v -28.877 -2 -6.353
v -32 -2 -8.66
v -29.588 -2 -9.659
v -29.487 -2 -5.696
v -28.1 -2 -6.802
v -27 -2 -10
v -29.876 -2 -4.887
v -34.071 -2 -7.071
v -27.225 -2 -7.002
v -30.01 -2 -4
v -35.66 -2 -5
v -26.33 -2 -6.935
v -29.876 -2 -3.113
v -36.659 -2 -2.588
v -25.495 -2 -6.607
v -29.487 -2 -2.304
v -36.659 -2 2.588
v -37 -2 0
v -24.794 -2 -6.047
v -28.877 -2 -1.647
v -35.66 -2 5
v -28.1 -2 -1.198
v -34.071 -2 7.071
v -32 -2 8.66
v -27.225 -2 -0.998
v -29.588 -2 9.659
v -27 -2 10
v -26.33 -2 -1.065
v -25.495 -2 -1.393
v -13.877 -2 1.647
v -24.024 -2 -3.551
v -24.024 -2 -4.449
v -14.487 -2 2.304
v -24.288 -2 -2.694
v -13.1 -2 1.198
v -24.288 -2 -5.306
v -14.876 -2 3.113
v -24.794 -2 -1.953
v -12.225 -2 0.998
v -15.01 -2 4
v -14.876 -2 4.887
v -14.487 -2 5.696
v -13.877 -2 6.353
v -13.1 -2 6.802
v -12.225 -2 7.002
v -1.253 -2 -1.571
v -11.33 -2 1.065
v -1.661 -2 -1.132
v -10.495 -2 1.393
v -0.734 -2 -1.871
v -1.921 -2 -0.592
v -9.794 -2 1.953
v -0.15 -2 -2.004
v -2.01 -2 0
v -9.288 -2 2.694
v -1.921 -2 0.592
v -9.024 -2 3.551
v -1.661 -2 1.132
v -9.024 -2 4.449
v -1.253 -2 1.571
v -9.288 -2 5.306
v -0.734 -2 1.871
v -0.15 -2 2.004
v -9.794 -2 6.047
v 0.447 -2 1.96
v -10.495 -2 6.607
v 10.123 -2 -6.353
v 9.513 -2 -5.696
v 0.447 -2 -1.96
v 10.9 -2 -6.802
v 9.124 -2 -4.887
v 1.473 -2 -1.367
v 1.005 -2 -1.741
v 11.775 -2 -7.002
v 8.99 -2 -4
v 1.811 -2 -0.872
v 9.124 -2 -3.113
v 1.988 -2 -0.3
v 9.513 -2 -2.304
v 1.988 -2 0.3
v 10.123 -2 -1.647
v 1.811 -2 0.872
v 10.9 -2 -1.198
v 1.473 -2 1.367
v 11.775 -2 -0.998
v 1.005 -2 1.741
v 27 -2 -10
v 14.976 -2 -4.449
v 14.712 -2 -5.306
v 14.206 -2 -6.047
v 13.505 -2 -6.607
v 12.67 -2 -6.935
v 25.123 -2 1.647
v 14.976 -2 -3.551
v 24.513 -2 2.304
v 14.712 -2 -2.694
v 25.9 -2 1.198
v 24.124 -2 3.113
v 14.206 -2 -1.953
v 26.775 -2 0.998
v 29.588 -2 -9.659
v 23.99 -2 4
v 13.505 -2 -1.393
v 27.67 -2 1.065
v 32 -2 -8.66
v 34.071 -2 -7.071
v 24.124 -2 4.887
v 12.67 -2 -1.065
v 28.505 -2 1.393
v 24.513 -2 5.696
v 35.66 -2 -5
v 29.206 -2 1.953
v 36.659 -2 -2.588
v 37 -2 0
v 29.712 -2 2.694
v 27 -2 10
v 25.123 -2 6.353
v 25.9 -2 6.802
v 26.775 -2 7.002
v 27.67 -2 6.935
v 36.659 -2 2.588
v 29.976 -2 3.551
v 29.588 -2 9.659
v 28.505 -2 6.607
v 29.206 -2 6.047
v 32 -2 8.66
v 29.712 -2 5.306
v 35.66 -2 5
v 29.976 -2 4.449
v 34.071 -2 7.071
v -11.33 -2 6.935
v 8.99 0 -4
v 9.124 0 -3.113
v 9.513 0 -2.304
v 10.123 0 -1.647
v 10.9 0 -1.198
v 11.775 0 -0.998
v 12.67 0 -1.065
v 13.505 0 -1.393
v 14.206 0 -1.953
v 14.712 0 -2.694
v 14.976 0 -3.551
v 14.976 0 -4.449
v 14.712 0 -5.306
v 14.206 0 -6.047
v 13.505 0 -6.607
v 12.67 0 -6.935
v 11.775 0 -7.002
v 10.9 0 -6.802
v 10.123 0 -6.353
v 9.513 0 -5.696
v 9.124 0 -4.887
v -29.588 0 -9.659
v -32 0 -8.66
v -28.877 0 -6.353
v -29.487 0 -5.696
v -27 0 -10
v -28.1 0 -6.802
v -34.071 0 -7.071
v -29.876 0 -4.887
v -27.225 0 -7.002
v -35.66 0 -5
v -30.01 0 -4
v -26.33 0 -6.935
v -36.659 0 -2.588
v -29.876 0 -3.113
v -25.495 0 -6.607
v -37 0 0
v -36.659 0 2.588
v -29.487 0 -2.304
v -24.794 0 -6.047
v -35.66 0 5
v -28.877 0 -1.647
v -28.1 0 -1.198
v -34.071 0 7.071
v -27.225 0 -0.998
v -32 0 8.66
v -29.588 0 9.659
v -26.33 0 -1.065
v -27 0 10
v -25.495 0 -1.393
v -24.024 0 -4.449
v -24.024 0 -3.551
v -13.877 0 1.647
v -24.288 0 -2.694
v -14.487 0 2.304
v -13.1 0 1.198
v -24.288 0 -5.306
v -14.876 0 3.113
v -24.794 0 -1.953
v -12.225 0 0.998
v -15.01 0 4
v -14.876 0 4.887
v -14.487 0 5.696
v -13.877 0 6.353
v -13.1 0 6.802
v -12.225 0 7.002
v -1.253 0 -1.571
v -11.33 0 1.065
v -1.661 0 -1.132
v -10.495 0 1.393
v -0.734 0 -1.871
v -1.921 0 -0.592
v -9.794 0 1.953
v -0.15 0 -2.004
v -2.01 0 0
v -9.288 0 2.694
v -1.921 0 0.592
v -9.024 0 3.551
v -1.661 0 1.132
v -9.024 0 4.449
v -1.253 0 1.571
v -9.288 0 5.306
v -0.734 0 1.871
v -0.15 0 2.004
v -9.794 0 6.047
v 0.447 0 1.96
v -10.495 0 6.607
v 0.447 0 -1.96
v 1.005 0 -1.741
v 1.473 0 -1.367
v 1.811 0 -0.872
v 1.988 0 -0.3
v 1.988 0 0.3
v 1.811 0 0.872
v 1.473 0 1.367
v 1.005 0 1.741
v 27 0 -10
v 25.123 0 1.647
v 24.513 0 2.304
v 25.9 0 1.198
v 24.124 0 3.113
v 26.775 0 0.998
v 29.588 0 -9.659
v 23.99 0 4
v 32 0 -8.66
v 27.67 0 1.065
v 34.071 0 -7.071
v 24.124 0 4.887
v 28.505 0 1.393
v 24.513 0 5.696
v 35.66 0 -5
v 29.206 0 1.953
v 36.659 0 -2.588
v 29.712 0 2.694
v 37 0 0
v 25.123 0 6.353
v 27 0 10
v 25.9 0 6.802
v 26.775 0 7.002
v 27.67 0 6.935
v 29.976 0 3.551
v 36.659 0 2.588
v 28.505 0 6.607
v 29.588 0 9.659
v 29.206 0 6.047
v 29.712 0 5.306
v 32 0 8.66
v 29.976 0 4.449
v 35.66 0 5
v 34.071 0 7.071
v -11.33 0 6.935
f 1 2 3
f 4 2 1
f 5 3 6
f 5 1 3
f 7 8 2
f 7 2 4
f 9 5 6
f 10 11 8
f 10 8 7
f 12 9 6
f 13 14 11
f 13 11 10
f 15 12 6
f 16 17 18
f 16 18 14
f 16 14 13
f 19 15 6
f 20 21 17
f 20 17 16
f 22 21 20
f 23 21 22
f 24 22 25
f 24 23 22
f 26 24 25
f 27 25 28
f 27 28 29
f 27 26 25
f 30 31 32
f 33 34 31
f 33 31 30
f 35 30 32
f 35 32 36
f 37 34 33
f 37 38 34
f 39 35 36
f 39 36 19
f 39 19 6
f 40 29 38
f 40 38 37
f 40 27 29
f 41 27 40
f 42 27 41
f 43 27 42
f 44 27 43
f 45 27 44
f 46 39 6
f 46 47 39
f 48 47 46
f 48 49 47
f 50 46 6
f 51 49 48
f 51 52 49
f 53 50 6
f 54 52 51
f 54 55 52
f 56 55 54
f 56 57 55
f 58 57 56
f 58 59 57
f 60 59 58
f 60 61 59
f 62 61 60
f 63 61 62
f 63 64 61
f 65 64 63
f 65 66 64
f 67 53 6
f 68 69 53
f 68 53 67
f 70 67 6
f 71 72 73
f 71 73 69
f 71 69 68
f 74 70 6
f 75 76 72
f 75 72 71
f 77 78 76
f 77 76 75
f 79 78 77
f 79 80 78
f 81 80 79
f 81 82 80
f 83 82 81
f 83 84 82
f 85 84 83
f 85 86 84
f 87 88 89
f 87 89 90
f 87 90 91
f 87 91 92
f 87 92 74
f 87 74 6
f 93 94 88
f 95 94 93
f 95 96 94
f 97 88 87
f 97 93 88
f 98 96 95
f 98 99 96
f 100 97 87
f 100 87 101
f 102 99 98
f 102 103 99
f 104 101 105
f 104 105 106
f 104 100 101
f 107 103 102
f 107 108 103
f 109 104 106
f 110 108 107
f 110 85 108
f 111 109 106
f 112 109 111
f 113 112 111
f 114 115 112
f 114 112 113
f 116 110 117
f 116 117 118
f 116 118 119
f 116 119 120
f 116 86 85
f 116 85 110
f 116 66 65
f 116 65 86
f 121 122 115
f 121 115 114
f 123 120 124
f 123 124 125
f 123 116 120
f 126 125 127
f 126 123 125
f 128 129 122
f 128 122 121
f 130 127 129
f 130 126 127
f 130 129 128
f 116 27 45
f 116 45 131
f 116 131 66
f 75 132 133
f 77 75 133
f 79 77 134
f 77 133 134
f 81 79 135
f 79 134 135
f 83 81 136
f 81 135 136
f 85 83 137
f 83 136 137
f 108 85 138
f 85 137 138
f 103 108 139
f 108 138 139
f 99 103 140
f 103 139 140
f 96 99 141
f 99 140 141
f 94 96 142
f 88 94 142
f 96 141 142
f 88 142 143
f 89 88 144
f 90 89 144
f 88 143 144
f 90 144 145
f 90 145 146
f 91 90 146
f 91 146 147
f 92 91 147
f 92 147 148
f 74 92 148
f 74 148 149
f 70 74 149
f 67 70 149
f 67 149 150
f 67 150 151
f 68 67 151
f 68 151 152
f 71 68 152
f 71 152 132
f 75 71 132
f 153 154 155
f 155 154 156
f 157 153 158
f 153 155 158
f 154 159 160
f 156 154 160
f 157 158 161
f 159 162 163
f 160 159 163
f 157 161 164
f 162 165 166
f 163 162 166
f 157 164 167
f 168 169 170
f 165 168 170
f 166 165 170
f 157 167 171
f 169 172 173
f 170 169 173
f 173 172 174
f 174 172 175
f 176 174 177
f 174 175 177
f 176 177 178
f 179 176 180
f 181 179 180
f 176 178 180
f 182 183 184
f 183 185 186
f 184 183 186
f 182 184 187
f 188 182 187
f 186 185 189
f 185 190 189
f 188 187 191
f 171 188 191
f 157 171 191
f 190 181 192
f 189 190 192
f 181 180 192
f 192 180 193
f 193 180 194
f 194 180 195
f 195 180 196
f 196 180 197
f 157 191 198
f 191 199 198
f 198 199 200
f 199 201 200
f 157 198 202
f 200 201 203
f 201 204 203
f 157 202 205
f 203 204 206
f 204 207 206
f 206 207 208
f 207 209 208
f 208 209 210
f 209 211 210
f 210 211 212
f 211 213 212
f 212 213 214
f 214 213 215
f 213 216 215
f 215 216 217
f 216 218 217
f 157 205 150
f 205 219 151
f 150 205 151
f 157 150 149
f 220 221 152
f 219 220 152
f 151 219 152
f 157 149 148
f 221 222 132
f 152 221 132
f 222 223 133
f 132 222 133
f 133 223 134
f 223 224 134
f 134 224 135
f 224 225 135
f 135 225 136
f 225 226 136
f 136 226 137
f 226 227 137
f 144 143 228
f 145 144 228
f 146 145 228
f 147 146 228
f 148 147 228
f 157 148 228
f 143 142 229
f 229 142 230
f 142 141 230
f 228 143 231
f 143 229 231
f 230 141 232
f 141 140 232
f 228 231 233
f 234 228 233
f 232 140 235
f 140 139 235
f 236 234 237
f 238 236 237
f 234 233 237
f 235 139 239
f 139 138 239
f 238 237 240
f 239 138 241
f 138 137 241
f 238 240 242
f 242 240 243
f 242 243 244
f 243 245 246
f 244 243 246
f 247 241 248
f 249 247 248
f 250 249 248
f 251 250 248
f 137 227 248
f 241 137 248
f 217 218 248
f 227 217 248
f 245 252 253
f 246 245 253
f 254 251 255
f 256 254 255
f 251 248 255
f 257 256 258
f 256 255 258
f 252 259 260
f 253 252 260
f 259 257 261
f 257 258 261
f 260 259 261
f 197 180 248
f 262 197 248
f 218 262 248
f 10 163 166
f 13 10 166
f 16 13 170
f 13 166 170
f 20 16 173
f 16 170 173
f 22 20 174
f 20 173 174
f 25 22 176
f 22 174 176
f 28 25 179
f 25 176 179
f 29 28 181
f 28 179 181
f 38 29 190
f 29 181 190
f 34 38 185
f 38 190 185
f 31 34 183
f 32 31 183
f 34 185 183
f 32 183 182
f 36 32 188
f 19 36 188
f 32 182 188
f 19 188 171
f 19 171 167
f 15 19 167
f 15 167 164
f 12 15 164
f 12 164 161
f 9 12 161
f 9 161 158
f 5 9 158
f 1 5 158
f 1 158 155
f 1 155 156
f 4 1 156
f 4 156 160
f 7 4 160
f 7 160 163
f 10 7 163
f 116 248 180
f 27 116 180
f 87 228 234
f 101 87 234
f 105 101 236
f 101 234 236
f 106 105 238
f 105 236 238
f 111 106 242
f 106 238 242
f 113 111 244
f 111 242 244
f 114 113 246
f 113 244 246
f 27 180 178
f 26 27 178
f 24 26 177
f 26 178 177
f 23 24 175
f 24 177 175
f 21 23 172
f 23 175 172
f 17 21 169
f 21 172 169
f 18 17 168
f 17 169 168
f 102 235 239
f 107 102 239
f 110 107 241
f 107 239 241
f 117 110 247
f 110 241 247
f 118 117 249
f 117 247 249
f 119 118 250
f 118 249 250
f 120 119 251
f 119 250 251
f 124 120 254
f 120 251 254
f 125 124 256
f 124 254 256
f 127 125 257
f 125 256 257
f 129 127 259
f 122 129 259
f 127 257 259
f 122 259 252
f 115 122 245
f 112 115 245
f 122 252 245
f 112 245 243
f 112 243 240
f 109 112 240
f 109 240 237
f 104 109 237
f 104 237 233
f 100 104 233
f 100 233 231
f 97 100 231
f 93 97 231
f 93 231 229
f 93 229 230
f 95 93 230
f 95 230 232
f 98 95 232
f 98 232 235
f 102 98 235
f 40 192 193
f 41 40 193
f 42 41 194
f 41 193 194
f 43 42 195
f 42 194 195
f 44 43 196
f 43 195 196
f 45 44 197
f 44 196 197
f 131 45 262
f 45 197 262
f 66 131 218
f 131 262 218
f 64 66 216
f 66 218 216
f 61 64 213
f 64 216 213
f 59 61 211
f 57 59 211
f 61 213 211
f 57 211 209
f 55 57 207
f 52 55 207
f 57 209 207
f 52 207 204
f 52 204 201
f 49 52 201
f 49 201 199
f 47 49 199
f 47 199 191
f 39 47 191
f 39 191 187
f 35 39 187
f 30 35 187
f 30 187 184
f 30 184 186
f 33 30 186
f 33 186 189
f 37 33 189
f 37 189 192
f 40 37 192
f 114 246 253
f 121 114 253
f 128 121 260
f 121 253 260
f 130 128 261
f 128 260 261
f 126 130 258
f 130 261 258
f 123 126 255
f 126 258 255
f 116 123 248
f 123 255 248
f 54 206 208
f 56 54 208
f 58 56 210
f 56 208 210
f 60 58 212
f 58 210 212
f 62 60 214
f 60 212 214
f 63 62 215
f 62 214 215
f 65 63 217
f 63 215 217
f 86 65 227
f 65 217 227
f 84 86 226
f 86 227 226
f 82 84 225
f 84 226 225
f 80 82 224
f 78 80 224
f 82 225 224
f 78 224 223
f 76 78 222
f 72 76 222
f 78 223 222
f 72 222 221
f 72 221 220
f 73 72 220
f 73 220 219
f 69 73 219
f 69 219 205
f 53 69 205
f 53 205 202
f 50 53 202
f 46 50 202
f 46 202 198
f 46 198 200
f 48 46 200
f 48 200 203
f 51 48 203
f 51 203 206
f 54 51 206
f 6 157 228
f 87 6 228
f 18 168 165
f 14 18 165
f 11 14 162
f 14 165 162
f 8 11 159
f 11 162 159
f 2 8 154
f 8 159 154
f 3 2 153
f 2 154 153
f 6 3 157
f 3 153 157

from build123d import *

# Parameters (mm, degrees)
F1_DEPTH = 2
F3_D     = 6.02
F5_D     = 4.02


with BuildPart() as f1:
    # F0 (on Front) → F1 (new body)
    with BuildSketch(Plane.XZ):
        with BuildLine():
            ThreePointArc((37, 0), (34.071068, 7.071068), (27, 10))
            Line((27, 10), (-27, 10))
            ThreePointArc((-27, 10), (-34.071068, 7.071068), (-37, 0))
            ThreePointArc((-37, 0), (-34.071068, -7.071068), (-27, -10))
            Line((-27, -10), (27, -10))
            ThreePointArc((27, -10), (34.071068, -7.071068), (37, 0))
        make_face()
    extrude(amount=F1_DEPTH)

    # F3 (through all)
    with Locations(Plane.XZ.offset(2)):
        with Locations((-12, 4), (-27, -4), (27, 4), (12, -4)):
            Hole(F3_D / 2)

    # F5 (through all)
    with Locations(Plane.XZ.offset(2)):
        with Locations((0, 0)):
            Hole(F5_D / 2)


solid = f1.part
